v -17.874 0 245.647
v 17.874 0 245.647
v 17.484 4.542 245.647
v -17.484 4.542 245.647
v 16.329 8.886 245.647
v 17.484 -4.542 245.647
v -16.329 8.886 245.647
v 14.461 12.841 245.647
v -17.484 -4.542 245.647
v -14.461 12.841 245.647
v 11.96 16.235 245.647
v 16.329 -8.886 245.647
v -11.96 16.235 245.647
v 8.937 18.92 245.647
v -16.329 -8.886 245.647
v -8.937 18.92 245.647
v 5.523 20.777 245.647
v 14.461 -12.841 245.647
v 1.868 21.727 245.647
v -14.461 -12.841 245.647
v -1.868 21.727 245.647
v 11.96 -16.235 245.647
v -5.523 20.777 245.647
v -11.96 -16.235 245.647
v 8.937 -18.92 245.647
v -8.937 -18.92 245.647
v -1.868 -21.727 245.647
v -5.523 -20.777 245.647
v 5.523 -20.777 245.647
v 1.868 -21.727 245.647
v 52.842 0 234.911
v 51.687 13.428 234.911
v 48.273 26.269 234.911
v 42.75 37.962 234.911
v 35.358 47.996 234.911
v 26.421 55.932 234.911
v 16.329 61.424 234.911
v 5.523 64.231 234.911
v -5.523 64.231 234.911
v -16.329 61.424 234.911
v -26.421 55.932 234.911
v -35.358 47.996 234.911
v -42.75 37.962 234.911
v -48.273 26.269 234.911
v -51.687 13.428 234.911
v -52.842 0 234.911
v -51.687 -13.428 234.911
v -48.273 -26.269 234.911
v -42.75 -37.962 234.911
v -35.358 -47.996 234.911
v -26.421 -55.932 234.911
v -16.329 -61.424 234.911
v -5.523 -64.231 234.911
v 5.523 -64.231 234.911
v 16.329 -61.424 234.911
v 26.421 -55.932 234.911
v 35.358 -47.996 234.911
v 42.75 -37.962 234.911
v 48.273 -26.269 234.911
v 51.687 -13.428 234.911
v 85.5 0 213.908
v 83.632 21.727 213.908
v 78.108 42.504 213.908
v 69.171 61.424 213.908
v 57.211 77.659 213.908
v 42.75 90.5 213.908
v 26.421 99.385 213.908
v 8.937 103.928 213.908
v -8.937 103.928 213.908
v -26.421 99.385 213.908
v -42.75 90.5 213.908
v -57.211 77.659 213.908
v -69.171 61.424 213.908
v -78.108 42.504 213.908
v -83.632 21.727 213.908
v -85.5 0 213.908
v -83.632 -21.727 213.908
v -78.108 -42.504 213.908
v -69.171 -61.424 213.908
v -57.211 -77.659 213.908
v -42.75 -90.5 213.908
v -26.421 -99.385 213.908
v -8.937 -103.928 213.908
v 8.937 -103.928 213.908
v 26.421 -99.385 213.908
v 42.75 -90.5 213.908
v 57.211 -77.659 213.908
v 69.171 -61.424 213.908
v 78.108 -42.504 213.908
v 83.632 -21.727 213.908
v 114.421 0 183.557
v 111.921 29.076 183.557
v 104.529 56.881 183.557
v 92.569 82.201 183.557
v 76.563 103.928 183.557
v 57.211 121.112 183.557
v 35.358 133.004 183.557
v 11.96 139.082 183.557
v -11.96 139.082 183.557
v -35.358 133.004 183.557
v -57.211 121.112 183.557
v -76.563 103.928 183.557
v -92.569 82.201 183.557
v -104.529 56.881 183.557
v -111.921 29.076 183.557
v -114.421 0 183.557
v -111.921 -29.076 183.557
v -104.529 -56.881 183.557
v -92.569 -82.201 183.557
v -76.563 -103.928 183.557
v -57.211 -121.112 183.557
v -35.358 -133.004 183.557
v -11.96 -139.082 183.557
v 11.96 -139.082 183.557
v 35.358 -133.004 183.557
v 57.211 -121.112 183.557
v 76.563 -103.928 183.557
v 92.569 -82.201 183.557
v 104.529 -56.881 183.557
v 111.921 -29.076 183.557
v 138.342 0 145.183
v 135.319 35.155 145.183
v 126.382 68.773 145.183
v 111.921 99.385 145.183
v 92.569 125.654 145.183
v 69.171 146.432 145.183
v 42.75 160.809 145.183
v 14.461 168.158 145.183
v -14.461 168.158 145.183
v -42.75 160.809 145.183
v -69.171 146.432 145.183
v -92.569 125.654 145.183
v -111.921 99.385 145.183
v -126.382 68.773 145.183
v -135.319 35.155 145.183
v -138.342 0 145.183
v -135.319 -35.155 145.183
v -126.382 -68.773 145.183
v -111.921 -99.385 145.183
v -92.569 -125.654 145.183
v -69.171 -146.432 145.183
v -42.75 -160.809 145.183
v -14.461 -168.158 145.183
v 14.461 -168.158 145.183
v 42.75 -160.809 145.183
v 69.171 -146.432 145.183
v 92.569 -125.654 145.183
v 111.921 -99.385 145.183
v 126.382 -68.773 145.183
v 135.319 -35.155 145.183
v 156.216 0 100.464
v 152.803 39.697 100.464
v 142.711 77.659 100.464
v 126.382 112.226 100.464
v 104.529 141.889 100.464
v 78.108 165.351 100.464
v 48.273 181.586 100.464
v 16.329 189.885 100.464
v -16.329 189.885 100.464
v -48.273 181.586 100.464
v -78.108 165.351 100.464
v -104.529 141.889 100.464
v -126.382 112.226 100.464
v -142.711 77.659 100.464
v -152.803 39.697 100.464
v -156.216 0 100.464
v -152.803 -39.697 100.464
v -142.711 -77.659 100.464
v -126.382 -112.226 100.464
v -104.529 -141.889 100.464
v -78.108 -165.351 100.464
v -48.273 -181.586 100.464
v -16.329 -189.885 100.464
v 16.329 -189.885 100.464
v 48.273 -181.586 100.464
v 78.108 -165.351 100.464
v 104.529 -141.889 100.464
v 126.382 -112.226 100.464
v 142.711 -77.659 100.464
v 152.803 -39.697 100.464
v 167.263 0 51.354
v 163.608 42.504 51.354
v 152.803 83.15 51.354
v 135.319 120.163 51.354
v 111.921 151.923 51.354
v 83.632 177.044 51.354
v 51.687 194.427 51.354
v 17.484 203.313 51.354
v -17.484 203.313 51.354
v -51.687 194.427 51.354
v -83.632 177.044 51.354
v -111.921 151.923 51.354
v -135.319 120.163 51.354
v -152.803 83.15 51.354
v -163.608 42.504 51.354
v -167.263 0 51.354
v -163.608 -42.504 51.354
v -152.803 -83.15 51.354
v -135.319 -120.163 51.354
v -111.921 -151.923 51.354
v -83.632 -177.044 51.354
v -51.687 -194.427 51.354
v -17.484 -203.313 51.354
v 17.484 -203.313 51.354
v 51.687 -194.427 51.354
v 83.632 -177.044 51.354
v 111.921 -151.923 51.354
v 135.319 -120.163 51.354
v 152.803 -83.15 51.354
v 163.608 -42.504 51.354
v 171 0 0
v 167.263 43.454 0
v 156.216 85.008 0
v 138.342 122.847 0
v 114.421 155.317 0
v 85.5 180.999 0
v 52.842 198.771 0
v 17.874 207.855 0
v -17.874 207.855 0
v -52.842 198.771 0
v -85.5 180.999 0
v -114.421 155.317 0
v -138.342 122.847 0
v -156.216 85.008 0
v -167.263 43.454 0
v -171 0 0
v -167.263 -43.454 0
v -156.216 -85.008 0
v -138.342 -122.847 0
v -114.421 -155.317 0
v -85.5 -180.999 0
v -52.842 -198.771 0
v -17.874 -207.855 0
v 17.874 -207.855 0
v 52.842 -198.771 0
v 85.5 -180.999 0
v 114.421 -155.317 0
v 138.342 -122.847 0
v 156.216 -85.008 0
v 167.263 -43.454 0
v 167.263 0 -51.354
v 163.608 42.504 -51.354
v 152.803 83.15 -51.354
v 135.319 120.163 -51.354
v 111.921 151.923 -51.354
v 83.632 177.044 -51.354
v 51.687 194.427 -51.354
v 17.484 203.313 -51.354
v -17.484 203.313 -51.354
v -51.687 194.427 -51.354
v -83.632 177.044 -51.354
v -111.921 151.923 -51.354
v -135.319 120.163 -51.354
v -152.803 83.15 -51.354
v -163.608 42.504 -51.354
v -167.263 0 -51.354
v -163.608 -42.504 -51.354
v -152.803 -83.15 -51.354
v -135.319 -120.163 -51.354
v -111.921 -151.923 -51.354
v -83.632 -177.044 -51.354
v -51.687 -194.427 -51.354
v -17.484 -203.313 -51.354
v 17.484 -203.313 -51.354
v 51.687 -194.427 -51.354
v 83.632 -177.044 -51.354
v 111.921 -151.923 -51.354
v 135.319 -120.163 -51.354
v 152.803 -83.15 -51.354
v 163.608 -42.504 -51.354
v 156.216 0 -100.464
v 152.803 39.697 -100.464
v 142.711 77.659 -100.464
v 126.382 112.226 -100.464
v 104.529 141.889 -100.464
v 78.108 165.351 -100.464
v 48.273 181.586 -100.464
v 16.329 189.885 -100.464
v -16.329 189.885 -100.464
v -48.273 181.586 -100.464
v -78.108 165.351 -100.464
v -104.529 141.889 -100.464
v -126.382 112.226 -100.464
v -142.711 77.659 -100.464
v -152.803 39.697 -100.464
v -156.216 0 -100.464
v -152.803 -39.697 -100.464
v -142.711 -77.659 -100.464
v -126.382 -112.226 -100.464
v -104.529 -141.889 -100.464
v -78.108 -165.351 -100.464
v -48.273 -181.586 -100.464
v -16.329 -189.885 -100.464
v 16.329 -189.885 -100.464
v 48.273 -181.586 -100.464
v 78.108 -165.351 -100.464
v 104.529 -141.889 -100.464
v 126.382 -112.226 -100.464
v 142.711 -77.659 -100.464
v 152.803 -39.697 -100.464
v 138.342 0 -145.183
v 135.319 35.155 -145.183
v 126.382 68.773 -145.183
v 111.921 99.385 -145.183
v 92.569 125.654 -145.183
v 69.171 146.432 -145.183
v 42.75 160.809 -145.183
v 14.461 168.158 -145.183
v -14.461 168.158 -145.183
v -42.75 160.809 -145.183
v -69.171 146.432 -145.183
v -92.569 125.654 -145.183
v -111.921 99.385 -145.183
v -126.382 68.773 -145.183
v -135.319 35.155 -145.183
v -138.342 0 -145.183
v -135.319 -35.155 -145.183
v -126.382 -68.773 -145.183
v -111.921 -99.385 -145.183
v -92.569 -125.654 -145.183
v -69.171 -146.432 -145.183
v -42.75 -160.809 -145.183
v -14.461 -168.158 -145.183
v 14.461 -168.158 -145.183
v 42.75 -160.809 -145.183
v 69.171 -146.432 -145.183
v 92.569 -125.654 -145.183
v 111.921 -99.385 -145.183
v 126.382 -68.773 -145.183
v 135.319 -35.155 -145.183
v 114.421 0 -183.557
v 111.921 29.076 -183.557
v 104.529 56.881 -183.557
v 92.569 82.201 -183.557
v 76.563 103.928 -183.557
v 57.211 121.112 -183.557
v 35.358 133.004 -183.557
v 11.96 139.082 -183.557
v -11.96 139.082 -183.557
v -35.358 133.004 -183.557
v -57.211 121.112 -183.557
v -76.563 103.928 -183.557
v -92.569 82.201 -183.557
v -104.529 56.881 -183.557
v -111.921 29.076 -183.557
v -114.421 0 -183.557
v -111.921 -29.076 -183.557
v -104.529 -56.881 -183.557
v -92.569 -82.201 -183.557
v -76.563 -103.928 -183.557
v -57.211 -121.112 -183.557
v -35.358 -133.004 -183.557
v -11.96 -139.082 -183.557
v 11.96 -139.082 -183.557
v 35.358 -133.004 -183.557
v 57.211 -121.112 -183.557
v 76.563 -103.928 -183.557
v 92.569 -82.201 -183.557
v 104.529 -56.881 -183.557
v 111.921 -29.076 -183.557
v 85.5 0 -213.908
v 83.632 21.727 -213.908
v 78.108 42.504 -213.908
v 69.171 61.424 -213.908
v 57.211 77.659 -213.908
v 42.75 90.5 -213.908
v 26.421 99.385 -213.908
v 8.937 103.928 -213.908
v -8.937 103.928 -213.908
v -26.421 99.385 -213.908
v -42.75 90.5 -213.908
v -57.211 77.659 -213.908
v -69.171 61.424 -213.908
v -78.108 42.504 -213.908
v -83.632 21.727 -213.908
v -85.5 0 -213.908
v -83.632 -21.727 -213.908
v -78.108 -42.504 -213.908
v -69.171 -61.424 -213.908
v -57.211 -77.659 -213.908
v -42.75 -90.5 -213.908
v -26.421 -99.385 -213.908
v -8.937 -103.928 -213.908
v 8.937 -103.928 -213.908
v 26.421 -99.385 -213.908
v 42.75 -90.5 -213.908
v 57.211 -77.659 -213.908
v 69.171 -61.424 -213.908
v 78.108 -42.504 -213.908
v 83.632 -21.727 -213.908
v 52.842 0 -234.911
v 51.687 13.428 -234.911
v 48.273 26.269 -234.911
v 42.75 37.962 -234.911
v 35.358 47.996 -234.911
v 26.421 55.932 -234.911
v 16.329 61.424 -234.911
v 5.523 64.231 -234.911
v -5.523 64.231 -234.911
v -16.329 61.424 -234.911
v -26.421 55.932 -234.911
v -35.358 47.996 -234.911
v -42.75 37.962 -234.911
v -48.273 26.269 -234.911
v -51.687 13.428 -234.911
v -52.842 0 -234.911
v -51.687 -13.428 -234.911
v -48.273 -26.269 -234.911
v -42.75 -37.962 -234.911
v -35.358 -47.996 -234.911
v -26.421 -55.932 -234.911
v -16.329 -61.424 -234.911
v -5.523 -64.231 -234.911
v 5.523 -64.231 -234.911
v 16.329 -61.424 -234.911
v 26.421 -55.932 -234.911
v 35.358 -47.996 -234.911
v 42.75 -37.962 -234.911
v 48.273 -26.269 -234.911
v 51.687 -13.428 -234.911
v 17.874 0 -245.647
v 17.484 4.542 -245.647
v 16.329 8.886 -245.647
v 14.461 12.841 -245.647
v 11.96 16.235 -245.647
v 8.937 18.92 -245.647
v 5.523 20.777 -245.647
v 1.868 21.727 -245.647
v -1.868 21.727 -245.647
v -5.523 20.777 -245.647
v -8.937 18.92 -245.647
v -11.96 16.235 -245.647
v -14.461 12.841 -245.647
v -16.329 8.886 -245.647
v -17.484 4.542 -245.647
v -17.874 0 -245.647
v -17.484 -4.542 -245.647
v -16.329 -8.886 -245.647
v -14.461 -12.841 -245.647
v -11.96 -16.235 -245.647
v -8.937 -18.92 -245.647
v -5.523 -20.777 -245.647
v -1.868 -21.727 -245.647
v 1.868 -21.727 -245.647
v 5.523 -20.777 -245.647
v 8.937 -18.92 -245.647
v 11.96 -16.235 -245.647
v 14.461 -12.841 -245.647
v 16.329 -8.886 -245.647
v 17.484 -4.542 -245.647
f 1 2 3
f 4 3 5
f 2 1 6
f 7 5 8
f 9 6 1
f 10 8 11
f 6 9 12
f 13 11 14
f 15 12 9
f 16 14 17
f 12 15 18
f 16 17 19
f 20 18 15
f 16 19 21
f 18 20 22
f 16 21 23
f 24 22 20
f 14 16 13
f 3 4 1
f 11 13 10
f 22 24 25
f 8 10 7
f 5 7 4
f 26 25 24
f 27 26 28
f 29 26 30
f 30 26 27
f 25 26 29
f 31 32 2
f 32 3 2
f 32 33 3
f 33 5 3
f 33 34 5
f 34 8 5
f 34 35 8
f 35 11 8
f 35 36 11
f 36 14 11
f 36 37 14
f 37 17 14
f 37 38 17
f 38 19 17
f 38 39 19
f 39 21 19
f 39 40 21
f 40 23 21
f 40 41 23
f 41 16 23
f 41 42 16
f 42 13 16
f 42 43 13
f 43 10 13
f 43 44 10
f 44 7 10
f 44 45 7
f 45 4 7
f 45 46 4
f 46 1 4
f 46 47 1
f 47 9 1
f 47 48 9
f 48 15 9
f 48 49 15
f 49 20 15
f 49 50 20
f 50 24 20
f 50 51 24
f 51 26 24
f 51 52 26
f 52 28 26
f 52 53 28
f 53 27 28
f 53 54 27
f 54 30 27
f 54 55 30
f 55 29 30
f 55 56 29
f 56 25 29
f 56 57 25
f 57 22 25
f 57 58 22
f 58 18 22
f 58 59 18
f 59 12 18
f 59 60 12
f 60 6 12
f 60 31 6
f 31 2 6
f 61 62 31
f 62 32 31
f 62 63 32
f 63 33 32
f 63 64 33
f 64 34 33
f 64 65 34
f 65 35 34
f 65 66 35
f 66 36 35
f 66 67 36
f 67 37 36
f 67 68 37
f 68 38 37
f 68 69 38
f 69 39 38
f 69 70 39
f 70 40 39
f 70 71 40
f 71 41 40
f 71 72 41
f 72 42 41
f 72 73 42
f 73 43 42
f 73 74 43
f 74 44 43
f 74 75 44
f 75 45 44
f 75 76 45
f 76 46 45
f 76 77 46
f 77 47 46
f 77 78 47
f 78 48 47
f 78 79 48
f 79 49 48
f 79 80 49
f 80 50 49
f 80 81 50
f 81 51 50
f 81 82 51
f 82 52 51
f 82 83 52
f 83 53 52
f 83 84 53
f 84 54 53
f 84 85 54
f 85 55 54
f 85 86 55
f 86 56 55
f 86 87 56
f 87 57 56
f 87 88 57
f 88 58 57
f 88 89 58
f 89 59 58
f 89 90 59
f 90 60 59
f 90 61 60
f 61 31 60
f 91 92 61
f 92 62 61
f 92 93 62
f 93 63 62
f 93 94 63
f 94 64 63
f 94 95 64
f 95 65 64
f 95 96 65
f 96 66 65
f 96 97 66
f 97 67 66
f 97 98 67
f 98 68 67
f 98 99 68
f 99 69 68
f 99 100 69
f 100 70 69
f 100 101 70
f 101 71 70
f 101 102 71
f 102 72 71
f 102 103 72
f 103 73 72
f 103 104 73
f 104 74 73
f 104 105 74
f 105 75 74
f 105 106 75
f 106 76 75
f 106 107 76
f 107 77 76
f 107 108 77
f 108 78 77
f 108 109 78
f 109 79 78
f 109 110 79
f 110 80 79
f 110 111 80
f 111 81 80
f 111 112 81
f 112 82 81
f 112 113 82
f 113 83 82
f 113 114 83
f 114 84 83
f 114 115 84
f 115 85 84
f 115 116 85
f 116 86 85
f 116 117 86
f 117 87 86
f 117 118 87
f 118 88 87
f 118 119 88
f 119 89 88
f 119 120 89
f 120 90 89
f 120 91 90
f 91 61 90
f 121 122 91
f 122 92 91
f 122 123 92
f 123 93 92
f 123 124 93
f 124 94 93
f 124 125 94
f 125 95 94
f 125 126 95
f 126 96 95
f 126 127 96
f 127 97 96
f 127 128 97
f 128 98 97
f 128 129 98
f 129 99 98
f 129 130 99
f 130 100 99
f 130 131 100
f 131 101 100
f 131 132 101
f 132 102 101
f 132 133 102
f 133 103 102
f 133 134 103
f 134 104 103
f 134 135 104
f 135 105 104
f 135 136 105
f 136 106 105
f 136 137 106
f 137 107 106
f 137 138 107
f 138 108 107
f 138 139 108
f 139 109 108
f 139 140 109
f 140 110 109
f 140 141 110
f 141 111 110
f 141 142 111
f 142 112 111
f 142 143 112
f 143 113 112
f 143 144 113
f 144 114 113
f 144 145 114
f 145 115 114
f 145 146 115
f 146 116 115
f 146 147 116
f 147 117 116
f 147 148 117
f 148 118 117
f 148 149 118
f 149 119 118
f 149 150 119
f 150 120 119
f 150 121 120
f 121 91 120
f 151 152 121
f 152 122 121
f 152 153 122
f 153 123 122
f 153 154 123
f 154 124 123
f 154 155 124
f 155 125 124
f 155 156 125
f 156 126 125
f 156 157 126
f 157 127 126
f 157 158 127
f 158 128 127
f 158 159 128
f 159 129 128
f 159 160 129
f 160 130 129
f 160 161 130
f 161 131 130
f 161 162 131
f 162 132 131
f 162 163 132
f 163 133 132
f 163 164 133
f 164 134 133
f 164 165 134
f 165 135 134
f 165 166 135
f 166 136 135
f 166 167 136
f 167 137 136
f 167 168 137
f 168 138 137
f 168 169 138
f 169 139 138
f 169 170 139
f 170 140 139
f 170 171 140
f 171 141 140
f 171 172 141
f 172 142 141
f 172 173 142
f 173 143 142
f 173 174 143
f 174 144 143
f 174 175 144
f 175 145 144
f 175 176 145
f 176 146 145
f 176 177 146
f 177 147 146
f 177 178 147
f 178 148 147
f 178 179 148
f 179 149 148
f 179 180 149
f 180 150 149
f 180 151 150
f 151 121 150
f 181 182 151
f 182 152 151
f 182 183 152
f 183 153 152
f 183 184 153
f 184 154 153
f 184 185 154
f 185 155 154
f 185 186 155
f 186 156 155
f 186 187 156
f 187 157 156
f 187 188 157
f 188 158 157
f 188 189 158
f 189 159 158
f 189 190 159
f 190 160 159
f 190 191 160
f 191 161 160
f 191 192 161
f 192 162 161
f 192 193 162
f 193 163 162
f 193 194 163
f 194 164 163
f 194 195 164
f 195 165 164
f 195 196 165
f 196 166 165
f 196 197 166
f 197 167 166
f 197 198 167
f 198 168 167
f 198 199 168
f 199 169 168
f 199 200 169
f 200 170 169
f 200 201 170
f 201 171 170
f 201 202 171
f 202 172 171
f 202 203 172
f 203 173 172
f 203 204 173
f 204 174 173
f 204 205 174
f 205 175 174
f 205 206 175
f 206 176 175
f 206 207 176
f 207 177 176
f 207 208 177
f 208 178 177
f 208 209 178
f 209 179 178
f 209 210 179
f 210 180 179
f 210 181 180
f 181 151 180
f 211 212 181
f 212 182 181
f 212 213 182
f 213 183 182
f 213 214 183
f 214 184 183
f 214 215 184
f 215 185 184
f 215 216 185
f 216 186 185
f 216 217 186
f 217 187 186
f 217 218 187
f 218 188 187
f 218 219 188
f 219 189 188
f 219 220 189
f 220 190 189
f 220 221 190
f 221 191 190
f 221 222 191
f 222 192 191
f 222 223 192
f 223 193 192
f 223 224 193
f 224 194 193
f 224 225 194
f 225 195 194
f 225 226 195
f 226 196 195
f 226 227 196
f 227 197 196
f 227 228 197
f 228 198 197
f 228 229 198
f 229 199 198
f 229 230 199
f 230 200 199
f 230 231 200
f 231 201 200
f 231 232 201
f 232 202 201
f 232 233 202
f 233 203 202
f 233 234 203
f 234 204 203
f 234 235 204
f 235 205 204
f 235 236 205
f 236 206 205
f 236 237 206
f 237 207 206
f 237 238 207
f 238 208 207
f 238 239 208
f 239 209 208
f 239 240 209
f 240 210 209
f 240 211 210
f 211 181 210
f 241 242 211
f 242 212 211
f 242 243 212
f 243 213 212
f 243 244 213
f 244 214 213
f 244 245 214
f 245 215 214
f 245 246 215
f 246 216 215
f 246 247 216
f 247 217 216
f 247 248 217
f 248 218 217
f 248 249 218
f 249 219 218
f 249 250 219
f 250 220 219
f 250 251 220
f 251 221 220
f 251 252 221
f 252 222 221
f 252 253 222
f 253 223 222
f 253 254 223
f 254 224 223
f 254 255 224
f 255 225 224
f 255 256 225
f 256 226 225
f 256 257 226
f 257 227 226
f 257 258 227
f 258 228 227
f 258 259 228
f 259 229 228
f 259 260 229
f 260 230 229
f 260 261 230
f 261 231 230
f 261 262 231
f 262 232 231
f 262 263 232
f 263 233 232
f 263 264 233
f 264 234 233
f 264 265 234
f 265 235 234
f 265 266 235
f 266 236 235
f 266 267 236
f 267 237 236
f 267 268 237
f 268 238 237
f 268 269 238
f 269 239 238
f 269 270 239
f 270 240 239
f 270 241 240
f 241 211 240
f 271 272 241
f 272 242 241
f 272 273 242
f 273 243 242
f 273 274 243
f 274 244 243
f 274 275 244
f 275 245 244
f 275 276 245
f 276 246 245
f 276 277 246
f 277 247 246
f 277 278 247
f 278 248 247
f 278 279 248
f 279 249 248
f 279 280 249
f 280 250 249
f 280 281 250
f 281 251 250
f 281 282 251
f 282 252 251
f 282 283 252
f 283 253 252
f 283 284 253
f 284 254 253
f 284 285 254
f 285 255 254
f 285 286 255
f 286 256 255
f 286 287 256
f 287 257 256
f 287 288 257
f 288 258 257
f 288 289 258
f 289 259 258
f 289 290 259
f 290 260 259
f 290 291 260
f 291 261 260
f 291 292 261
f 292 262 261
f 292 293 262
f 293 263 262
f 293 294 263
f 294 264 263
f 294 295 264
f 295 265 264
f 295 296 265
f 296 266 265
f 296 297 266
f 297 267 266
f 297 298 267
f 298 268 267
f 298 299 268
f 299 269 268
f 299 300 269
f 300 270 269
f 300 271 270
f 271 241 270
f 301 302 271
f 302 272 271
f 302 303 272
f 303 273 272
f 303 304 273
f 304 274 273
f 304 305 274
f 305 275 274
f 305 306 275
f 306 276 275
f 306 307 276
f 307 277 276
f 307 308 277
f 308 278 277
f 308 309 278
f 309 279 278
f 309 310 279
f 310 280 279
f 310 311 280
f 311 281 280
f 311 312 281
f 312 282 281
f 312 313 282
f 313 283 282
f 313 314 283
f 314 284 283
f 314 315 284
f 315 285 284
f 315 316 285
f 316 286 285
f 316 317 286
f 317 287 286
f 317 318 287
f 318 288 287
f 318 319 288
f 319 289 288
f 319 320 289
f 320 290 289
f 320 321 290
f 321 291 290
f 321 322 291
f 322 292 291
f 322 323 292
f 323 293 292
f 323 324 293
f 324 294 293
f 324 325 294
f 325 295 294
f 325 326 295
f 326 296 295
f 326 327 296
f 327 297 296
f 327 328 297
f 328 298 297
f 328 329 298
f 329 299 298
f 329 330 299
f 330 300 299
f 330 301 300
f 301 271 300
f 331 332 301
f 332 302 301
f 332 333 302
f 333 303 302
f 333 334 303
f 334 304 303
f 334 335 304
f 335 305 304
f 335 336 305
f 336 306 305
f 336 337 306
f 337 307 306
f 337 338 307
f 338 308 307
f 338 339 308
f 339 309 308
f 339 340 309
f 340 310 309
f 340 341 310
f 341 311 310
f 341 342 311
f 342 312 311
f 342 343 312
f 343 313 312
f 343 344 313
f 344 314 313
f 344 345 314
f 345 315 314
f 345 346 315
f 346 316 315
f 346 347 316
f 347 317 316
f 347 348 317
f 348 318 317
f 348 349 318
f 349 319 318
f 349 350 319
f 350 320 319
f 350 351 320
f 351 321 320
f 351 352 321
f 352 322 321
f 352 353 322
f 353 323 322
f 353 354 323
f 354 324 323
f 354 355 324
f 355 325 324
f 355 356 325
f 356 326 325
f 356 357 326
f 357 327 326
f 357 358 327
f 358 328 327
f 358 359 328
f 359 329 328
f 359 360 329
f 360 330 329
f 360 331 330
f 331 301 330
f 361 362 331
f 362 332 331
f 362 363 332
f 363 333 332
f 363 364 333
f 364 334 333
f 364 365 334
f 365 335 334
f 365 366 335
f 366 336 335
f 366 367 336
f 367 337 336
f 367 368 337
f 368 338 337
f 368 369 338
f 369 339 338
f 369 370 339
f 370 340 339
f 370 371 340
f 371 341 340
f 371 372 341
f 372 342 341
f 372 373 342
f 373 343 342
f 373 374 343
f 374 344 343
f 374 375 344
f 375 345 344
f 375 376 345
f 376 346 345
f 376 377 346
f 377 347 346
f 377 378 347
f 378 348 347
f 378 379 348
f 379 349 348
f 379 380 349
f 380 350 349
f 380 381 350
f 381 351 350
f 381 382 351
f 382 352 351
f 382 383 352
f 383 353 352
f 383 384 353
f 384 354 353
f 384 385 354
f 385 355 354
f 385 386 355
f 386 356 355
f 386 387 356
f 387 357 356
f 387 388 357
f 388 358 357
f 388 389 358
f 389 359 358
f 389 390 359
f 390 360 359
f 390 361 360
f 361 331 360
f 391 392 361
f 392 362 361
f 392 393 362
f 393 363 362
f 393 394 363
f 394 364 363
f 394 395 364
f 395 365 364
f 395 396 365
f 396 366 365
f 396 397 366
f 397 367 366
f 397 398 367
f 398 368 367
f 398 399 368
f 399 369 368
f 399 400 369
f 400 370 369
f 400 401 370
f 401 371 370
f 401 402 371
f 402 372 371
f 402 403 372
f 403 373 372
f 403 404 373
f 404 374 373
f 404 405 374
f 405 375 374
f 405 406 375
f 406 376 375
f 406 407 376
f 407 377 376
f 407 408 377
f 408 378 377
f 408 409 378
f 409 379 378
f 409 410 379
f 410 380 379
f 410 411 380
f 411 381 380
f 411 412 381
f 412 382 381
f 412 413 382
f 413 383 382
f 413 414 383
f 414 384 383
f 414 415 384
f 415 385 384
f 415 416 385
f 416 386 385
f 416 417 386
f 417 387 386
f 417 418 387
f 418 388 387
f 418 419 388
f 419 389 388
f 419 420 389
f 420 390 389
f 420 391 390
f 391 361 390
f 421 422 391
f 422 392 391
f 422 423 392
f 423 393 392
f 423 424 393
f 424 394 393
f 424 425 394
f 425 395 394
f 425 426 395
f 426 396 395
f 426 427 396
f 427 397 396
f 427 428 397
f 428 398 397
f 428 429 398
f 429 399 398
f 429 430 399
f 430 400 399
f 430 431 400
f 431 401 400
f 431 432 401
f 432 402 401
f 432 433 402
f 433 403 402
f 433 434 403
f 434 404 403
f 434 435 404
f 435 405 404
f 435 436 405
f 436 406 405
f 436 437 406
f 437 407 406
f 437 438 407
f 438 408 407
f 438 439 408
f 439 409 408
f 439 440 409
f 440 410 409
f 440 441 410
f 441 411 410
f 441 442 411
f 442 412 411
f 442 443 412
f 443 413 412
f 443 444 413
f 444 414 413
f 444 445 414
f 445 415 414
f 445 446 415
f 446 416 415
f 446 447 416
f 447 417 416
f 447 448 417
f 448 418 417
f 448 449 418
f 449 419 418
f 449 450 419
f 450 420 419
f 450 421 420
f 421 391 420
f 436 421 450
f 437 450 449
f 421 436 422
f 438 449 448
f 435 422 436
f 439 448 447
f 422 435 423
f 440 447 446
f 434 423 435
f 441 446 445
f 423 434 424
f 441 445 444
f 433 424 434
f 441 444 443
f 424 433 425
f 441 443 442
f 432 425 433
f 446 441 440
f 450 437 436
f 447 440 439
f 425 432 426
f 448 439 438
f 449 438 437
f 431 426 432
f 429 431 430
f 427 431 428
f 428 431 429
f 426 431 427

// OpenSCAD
// Generated by SolidPython 1.0.1 on 2020-07-29 00:39:26


scale(v = [9, 11, 13]) {
	sphere(r = 19);
}
/***********************************************
*********      SolidPython code:      **********
************************************************
 
# import packages: SolidPython
from solid import *
from solid.utils import *
from itertools import chain, combinations


class Resize:

    def __init__(self, scad_file):
        self.scad_file = scad_file
        #self.scad_file = import_scad(scad_file)
        # cone/cylinder param:
        self.r1 = 0
        self.r2 = 0
        self.h = 0
        # rectangular prism param:
        self.w = 0
        self.l = 0
        # ellipse param:
        self.r = 0

    # import OpenScad code (file name corresponds to shape)


    # classify shape + parameters
    def assign(self, param1, param2, param3):
        if self.scad_file == 'cone.scad':
            self.r1 = param1
            self.r2 = param2
            self.h = param3
        elif self.scad_file == 'cylinder.scad':
            self.r1 = param1
            self.r2 = param2
            self.h = param3
        elif self.scad_file == 'rectangularPrism.scad':
            self.h = param1
            self.l = param2
            self.w = param3
        else:
            self.r = param1
            self.h = param2

    # resize parameters
    def iterate(self):
        x = range(3, 20, 2)
        i = 1
        if self.scad_file == 'cone.scad':
            tempList = list(combinations(x, 2))
            for temp in tempList:
                param1 = temp[0]
                param2 = temp[1]
                filepath = 'produced_scad_files/' + 'cone' + str(param1) + '_' + str(param2) + '_' + '.scad'
                scad_render_to_file(cylinder(h=param1, r1=param2, r2=0), filepath)

        elif self.scad_file == 'cylinder.scad':
            tempList = list(combinations(x, 3))
            for temp in tempList:
                param1 = temp[0]
                param2 = temp[1]
                filepath = 'produced_scad_files/' + 'cylinder' + str(param1) + '_' + str(param2) + '_' + '.scad'
                scad_render_to_file(cylinder(h=param1, r1=param2, r2=param2), filepath)

        elif self.scad_file == 'rectangularPrism.scad':
            tempList = list(combinations(x, 3))
            for temp in tempList:
                param1 = temp[0]
                param2 = temp[1]
                param3 = temp[2]
                filepath = 'produced_scad_files/' + 'rectangularPrism' + str(param1) + '_' + str(param2) + '_' + str(
                    param3) + '.scad'
                scad_render_to_file(cube(size=(param1, param2, param3)), filepath)

        elif self.scad_file == 'ellipse.scad':
            tempList = list(combinations(x, 4))
            for temp in tempList:
                param1 = temp[0]
                param2 = temp[1]
                param3 = temp[2]
                param4 = temp[3]
                filepath = 'produced_scad_files/' + 'ellipse' + str(param1) + '_' + str(param2) + '_' + str(param3) + '_' + str(param4) + '.scad'
                scad_render_to_file(scale([param1, param2, param3])(sphere(r=param4)), filepath)

    def render_to_scadfile(self):
        scad_render_to_file(scad, 'example.scad') 
 
************************************************/
